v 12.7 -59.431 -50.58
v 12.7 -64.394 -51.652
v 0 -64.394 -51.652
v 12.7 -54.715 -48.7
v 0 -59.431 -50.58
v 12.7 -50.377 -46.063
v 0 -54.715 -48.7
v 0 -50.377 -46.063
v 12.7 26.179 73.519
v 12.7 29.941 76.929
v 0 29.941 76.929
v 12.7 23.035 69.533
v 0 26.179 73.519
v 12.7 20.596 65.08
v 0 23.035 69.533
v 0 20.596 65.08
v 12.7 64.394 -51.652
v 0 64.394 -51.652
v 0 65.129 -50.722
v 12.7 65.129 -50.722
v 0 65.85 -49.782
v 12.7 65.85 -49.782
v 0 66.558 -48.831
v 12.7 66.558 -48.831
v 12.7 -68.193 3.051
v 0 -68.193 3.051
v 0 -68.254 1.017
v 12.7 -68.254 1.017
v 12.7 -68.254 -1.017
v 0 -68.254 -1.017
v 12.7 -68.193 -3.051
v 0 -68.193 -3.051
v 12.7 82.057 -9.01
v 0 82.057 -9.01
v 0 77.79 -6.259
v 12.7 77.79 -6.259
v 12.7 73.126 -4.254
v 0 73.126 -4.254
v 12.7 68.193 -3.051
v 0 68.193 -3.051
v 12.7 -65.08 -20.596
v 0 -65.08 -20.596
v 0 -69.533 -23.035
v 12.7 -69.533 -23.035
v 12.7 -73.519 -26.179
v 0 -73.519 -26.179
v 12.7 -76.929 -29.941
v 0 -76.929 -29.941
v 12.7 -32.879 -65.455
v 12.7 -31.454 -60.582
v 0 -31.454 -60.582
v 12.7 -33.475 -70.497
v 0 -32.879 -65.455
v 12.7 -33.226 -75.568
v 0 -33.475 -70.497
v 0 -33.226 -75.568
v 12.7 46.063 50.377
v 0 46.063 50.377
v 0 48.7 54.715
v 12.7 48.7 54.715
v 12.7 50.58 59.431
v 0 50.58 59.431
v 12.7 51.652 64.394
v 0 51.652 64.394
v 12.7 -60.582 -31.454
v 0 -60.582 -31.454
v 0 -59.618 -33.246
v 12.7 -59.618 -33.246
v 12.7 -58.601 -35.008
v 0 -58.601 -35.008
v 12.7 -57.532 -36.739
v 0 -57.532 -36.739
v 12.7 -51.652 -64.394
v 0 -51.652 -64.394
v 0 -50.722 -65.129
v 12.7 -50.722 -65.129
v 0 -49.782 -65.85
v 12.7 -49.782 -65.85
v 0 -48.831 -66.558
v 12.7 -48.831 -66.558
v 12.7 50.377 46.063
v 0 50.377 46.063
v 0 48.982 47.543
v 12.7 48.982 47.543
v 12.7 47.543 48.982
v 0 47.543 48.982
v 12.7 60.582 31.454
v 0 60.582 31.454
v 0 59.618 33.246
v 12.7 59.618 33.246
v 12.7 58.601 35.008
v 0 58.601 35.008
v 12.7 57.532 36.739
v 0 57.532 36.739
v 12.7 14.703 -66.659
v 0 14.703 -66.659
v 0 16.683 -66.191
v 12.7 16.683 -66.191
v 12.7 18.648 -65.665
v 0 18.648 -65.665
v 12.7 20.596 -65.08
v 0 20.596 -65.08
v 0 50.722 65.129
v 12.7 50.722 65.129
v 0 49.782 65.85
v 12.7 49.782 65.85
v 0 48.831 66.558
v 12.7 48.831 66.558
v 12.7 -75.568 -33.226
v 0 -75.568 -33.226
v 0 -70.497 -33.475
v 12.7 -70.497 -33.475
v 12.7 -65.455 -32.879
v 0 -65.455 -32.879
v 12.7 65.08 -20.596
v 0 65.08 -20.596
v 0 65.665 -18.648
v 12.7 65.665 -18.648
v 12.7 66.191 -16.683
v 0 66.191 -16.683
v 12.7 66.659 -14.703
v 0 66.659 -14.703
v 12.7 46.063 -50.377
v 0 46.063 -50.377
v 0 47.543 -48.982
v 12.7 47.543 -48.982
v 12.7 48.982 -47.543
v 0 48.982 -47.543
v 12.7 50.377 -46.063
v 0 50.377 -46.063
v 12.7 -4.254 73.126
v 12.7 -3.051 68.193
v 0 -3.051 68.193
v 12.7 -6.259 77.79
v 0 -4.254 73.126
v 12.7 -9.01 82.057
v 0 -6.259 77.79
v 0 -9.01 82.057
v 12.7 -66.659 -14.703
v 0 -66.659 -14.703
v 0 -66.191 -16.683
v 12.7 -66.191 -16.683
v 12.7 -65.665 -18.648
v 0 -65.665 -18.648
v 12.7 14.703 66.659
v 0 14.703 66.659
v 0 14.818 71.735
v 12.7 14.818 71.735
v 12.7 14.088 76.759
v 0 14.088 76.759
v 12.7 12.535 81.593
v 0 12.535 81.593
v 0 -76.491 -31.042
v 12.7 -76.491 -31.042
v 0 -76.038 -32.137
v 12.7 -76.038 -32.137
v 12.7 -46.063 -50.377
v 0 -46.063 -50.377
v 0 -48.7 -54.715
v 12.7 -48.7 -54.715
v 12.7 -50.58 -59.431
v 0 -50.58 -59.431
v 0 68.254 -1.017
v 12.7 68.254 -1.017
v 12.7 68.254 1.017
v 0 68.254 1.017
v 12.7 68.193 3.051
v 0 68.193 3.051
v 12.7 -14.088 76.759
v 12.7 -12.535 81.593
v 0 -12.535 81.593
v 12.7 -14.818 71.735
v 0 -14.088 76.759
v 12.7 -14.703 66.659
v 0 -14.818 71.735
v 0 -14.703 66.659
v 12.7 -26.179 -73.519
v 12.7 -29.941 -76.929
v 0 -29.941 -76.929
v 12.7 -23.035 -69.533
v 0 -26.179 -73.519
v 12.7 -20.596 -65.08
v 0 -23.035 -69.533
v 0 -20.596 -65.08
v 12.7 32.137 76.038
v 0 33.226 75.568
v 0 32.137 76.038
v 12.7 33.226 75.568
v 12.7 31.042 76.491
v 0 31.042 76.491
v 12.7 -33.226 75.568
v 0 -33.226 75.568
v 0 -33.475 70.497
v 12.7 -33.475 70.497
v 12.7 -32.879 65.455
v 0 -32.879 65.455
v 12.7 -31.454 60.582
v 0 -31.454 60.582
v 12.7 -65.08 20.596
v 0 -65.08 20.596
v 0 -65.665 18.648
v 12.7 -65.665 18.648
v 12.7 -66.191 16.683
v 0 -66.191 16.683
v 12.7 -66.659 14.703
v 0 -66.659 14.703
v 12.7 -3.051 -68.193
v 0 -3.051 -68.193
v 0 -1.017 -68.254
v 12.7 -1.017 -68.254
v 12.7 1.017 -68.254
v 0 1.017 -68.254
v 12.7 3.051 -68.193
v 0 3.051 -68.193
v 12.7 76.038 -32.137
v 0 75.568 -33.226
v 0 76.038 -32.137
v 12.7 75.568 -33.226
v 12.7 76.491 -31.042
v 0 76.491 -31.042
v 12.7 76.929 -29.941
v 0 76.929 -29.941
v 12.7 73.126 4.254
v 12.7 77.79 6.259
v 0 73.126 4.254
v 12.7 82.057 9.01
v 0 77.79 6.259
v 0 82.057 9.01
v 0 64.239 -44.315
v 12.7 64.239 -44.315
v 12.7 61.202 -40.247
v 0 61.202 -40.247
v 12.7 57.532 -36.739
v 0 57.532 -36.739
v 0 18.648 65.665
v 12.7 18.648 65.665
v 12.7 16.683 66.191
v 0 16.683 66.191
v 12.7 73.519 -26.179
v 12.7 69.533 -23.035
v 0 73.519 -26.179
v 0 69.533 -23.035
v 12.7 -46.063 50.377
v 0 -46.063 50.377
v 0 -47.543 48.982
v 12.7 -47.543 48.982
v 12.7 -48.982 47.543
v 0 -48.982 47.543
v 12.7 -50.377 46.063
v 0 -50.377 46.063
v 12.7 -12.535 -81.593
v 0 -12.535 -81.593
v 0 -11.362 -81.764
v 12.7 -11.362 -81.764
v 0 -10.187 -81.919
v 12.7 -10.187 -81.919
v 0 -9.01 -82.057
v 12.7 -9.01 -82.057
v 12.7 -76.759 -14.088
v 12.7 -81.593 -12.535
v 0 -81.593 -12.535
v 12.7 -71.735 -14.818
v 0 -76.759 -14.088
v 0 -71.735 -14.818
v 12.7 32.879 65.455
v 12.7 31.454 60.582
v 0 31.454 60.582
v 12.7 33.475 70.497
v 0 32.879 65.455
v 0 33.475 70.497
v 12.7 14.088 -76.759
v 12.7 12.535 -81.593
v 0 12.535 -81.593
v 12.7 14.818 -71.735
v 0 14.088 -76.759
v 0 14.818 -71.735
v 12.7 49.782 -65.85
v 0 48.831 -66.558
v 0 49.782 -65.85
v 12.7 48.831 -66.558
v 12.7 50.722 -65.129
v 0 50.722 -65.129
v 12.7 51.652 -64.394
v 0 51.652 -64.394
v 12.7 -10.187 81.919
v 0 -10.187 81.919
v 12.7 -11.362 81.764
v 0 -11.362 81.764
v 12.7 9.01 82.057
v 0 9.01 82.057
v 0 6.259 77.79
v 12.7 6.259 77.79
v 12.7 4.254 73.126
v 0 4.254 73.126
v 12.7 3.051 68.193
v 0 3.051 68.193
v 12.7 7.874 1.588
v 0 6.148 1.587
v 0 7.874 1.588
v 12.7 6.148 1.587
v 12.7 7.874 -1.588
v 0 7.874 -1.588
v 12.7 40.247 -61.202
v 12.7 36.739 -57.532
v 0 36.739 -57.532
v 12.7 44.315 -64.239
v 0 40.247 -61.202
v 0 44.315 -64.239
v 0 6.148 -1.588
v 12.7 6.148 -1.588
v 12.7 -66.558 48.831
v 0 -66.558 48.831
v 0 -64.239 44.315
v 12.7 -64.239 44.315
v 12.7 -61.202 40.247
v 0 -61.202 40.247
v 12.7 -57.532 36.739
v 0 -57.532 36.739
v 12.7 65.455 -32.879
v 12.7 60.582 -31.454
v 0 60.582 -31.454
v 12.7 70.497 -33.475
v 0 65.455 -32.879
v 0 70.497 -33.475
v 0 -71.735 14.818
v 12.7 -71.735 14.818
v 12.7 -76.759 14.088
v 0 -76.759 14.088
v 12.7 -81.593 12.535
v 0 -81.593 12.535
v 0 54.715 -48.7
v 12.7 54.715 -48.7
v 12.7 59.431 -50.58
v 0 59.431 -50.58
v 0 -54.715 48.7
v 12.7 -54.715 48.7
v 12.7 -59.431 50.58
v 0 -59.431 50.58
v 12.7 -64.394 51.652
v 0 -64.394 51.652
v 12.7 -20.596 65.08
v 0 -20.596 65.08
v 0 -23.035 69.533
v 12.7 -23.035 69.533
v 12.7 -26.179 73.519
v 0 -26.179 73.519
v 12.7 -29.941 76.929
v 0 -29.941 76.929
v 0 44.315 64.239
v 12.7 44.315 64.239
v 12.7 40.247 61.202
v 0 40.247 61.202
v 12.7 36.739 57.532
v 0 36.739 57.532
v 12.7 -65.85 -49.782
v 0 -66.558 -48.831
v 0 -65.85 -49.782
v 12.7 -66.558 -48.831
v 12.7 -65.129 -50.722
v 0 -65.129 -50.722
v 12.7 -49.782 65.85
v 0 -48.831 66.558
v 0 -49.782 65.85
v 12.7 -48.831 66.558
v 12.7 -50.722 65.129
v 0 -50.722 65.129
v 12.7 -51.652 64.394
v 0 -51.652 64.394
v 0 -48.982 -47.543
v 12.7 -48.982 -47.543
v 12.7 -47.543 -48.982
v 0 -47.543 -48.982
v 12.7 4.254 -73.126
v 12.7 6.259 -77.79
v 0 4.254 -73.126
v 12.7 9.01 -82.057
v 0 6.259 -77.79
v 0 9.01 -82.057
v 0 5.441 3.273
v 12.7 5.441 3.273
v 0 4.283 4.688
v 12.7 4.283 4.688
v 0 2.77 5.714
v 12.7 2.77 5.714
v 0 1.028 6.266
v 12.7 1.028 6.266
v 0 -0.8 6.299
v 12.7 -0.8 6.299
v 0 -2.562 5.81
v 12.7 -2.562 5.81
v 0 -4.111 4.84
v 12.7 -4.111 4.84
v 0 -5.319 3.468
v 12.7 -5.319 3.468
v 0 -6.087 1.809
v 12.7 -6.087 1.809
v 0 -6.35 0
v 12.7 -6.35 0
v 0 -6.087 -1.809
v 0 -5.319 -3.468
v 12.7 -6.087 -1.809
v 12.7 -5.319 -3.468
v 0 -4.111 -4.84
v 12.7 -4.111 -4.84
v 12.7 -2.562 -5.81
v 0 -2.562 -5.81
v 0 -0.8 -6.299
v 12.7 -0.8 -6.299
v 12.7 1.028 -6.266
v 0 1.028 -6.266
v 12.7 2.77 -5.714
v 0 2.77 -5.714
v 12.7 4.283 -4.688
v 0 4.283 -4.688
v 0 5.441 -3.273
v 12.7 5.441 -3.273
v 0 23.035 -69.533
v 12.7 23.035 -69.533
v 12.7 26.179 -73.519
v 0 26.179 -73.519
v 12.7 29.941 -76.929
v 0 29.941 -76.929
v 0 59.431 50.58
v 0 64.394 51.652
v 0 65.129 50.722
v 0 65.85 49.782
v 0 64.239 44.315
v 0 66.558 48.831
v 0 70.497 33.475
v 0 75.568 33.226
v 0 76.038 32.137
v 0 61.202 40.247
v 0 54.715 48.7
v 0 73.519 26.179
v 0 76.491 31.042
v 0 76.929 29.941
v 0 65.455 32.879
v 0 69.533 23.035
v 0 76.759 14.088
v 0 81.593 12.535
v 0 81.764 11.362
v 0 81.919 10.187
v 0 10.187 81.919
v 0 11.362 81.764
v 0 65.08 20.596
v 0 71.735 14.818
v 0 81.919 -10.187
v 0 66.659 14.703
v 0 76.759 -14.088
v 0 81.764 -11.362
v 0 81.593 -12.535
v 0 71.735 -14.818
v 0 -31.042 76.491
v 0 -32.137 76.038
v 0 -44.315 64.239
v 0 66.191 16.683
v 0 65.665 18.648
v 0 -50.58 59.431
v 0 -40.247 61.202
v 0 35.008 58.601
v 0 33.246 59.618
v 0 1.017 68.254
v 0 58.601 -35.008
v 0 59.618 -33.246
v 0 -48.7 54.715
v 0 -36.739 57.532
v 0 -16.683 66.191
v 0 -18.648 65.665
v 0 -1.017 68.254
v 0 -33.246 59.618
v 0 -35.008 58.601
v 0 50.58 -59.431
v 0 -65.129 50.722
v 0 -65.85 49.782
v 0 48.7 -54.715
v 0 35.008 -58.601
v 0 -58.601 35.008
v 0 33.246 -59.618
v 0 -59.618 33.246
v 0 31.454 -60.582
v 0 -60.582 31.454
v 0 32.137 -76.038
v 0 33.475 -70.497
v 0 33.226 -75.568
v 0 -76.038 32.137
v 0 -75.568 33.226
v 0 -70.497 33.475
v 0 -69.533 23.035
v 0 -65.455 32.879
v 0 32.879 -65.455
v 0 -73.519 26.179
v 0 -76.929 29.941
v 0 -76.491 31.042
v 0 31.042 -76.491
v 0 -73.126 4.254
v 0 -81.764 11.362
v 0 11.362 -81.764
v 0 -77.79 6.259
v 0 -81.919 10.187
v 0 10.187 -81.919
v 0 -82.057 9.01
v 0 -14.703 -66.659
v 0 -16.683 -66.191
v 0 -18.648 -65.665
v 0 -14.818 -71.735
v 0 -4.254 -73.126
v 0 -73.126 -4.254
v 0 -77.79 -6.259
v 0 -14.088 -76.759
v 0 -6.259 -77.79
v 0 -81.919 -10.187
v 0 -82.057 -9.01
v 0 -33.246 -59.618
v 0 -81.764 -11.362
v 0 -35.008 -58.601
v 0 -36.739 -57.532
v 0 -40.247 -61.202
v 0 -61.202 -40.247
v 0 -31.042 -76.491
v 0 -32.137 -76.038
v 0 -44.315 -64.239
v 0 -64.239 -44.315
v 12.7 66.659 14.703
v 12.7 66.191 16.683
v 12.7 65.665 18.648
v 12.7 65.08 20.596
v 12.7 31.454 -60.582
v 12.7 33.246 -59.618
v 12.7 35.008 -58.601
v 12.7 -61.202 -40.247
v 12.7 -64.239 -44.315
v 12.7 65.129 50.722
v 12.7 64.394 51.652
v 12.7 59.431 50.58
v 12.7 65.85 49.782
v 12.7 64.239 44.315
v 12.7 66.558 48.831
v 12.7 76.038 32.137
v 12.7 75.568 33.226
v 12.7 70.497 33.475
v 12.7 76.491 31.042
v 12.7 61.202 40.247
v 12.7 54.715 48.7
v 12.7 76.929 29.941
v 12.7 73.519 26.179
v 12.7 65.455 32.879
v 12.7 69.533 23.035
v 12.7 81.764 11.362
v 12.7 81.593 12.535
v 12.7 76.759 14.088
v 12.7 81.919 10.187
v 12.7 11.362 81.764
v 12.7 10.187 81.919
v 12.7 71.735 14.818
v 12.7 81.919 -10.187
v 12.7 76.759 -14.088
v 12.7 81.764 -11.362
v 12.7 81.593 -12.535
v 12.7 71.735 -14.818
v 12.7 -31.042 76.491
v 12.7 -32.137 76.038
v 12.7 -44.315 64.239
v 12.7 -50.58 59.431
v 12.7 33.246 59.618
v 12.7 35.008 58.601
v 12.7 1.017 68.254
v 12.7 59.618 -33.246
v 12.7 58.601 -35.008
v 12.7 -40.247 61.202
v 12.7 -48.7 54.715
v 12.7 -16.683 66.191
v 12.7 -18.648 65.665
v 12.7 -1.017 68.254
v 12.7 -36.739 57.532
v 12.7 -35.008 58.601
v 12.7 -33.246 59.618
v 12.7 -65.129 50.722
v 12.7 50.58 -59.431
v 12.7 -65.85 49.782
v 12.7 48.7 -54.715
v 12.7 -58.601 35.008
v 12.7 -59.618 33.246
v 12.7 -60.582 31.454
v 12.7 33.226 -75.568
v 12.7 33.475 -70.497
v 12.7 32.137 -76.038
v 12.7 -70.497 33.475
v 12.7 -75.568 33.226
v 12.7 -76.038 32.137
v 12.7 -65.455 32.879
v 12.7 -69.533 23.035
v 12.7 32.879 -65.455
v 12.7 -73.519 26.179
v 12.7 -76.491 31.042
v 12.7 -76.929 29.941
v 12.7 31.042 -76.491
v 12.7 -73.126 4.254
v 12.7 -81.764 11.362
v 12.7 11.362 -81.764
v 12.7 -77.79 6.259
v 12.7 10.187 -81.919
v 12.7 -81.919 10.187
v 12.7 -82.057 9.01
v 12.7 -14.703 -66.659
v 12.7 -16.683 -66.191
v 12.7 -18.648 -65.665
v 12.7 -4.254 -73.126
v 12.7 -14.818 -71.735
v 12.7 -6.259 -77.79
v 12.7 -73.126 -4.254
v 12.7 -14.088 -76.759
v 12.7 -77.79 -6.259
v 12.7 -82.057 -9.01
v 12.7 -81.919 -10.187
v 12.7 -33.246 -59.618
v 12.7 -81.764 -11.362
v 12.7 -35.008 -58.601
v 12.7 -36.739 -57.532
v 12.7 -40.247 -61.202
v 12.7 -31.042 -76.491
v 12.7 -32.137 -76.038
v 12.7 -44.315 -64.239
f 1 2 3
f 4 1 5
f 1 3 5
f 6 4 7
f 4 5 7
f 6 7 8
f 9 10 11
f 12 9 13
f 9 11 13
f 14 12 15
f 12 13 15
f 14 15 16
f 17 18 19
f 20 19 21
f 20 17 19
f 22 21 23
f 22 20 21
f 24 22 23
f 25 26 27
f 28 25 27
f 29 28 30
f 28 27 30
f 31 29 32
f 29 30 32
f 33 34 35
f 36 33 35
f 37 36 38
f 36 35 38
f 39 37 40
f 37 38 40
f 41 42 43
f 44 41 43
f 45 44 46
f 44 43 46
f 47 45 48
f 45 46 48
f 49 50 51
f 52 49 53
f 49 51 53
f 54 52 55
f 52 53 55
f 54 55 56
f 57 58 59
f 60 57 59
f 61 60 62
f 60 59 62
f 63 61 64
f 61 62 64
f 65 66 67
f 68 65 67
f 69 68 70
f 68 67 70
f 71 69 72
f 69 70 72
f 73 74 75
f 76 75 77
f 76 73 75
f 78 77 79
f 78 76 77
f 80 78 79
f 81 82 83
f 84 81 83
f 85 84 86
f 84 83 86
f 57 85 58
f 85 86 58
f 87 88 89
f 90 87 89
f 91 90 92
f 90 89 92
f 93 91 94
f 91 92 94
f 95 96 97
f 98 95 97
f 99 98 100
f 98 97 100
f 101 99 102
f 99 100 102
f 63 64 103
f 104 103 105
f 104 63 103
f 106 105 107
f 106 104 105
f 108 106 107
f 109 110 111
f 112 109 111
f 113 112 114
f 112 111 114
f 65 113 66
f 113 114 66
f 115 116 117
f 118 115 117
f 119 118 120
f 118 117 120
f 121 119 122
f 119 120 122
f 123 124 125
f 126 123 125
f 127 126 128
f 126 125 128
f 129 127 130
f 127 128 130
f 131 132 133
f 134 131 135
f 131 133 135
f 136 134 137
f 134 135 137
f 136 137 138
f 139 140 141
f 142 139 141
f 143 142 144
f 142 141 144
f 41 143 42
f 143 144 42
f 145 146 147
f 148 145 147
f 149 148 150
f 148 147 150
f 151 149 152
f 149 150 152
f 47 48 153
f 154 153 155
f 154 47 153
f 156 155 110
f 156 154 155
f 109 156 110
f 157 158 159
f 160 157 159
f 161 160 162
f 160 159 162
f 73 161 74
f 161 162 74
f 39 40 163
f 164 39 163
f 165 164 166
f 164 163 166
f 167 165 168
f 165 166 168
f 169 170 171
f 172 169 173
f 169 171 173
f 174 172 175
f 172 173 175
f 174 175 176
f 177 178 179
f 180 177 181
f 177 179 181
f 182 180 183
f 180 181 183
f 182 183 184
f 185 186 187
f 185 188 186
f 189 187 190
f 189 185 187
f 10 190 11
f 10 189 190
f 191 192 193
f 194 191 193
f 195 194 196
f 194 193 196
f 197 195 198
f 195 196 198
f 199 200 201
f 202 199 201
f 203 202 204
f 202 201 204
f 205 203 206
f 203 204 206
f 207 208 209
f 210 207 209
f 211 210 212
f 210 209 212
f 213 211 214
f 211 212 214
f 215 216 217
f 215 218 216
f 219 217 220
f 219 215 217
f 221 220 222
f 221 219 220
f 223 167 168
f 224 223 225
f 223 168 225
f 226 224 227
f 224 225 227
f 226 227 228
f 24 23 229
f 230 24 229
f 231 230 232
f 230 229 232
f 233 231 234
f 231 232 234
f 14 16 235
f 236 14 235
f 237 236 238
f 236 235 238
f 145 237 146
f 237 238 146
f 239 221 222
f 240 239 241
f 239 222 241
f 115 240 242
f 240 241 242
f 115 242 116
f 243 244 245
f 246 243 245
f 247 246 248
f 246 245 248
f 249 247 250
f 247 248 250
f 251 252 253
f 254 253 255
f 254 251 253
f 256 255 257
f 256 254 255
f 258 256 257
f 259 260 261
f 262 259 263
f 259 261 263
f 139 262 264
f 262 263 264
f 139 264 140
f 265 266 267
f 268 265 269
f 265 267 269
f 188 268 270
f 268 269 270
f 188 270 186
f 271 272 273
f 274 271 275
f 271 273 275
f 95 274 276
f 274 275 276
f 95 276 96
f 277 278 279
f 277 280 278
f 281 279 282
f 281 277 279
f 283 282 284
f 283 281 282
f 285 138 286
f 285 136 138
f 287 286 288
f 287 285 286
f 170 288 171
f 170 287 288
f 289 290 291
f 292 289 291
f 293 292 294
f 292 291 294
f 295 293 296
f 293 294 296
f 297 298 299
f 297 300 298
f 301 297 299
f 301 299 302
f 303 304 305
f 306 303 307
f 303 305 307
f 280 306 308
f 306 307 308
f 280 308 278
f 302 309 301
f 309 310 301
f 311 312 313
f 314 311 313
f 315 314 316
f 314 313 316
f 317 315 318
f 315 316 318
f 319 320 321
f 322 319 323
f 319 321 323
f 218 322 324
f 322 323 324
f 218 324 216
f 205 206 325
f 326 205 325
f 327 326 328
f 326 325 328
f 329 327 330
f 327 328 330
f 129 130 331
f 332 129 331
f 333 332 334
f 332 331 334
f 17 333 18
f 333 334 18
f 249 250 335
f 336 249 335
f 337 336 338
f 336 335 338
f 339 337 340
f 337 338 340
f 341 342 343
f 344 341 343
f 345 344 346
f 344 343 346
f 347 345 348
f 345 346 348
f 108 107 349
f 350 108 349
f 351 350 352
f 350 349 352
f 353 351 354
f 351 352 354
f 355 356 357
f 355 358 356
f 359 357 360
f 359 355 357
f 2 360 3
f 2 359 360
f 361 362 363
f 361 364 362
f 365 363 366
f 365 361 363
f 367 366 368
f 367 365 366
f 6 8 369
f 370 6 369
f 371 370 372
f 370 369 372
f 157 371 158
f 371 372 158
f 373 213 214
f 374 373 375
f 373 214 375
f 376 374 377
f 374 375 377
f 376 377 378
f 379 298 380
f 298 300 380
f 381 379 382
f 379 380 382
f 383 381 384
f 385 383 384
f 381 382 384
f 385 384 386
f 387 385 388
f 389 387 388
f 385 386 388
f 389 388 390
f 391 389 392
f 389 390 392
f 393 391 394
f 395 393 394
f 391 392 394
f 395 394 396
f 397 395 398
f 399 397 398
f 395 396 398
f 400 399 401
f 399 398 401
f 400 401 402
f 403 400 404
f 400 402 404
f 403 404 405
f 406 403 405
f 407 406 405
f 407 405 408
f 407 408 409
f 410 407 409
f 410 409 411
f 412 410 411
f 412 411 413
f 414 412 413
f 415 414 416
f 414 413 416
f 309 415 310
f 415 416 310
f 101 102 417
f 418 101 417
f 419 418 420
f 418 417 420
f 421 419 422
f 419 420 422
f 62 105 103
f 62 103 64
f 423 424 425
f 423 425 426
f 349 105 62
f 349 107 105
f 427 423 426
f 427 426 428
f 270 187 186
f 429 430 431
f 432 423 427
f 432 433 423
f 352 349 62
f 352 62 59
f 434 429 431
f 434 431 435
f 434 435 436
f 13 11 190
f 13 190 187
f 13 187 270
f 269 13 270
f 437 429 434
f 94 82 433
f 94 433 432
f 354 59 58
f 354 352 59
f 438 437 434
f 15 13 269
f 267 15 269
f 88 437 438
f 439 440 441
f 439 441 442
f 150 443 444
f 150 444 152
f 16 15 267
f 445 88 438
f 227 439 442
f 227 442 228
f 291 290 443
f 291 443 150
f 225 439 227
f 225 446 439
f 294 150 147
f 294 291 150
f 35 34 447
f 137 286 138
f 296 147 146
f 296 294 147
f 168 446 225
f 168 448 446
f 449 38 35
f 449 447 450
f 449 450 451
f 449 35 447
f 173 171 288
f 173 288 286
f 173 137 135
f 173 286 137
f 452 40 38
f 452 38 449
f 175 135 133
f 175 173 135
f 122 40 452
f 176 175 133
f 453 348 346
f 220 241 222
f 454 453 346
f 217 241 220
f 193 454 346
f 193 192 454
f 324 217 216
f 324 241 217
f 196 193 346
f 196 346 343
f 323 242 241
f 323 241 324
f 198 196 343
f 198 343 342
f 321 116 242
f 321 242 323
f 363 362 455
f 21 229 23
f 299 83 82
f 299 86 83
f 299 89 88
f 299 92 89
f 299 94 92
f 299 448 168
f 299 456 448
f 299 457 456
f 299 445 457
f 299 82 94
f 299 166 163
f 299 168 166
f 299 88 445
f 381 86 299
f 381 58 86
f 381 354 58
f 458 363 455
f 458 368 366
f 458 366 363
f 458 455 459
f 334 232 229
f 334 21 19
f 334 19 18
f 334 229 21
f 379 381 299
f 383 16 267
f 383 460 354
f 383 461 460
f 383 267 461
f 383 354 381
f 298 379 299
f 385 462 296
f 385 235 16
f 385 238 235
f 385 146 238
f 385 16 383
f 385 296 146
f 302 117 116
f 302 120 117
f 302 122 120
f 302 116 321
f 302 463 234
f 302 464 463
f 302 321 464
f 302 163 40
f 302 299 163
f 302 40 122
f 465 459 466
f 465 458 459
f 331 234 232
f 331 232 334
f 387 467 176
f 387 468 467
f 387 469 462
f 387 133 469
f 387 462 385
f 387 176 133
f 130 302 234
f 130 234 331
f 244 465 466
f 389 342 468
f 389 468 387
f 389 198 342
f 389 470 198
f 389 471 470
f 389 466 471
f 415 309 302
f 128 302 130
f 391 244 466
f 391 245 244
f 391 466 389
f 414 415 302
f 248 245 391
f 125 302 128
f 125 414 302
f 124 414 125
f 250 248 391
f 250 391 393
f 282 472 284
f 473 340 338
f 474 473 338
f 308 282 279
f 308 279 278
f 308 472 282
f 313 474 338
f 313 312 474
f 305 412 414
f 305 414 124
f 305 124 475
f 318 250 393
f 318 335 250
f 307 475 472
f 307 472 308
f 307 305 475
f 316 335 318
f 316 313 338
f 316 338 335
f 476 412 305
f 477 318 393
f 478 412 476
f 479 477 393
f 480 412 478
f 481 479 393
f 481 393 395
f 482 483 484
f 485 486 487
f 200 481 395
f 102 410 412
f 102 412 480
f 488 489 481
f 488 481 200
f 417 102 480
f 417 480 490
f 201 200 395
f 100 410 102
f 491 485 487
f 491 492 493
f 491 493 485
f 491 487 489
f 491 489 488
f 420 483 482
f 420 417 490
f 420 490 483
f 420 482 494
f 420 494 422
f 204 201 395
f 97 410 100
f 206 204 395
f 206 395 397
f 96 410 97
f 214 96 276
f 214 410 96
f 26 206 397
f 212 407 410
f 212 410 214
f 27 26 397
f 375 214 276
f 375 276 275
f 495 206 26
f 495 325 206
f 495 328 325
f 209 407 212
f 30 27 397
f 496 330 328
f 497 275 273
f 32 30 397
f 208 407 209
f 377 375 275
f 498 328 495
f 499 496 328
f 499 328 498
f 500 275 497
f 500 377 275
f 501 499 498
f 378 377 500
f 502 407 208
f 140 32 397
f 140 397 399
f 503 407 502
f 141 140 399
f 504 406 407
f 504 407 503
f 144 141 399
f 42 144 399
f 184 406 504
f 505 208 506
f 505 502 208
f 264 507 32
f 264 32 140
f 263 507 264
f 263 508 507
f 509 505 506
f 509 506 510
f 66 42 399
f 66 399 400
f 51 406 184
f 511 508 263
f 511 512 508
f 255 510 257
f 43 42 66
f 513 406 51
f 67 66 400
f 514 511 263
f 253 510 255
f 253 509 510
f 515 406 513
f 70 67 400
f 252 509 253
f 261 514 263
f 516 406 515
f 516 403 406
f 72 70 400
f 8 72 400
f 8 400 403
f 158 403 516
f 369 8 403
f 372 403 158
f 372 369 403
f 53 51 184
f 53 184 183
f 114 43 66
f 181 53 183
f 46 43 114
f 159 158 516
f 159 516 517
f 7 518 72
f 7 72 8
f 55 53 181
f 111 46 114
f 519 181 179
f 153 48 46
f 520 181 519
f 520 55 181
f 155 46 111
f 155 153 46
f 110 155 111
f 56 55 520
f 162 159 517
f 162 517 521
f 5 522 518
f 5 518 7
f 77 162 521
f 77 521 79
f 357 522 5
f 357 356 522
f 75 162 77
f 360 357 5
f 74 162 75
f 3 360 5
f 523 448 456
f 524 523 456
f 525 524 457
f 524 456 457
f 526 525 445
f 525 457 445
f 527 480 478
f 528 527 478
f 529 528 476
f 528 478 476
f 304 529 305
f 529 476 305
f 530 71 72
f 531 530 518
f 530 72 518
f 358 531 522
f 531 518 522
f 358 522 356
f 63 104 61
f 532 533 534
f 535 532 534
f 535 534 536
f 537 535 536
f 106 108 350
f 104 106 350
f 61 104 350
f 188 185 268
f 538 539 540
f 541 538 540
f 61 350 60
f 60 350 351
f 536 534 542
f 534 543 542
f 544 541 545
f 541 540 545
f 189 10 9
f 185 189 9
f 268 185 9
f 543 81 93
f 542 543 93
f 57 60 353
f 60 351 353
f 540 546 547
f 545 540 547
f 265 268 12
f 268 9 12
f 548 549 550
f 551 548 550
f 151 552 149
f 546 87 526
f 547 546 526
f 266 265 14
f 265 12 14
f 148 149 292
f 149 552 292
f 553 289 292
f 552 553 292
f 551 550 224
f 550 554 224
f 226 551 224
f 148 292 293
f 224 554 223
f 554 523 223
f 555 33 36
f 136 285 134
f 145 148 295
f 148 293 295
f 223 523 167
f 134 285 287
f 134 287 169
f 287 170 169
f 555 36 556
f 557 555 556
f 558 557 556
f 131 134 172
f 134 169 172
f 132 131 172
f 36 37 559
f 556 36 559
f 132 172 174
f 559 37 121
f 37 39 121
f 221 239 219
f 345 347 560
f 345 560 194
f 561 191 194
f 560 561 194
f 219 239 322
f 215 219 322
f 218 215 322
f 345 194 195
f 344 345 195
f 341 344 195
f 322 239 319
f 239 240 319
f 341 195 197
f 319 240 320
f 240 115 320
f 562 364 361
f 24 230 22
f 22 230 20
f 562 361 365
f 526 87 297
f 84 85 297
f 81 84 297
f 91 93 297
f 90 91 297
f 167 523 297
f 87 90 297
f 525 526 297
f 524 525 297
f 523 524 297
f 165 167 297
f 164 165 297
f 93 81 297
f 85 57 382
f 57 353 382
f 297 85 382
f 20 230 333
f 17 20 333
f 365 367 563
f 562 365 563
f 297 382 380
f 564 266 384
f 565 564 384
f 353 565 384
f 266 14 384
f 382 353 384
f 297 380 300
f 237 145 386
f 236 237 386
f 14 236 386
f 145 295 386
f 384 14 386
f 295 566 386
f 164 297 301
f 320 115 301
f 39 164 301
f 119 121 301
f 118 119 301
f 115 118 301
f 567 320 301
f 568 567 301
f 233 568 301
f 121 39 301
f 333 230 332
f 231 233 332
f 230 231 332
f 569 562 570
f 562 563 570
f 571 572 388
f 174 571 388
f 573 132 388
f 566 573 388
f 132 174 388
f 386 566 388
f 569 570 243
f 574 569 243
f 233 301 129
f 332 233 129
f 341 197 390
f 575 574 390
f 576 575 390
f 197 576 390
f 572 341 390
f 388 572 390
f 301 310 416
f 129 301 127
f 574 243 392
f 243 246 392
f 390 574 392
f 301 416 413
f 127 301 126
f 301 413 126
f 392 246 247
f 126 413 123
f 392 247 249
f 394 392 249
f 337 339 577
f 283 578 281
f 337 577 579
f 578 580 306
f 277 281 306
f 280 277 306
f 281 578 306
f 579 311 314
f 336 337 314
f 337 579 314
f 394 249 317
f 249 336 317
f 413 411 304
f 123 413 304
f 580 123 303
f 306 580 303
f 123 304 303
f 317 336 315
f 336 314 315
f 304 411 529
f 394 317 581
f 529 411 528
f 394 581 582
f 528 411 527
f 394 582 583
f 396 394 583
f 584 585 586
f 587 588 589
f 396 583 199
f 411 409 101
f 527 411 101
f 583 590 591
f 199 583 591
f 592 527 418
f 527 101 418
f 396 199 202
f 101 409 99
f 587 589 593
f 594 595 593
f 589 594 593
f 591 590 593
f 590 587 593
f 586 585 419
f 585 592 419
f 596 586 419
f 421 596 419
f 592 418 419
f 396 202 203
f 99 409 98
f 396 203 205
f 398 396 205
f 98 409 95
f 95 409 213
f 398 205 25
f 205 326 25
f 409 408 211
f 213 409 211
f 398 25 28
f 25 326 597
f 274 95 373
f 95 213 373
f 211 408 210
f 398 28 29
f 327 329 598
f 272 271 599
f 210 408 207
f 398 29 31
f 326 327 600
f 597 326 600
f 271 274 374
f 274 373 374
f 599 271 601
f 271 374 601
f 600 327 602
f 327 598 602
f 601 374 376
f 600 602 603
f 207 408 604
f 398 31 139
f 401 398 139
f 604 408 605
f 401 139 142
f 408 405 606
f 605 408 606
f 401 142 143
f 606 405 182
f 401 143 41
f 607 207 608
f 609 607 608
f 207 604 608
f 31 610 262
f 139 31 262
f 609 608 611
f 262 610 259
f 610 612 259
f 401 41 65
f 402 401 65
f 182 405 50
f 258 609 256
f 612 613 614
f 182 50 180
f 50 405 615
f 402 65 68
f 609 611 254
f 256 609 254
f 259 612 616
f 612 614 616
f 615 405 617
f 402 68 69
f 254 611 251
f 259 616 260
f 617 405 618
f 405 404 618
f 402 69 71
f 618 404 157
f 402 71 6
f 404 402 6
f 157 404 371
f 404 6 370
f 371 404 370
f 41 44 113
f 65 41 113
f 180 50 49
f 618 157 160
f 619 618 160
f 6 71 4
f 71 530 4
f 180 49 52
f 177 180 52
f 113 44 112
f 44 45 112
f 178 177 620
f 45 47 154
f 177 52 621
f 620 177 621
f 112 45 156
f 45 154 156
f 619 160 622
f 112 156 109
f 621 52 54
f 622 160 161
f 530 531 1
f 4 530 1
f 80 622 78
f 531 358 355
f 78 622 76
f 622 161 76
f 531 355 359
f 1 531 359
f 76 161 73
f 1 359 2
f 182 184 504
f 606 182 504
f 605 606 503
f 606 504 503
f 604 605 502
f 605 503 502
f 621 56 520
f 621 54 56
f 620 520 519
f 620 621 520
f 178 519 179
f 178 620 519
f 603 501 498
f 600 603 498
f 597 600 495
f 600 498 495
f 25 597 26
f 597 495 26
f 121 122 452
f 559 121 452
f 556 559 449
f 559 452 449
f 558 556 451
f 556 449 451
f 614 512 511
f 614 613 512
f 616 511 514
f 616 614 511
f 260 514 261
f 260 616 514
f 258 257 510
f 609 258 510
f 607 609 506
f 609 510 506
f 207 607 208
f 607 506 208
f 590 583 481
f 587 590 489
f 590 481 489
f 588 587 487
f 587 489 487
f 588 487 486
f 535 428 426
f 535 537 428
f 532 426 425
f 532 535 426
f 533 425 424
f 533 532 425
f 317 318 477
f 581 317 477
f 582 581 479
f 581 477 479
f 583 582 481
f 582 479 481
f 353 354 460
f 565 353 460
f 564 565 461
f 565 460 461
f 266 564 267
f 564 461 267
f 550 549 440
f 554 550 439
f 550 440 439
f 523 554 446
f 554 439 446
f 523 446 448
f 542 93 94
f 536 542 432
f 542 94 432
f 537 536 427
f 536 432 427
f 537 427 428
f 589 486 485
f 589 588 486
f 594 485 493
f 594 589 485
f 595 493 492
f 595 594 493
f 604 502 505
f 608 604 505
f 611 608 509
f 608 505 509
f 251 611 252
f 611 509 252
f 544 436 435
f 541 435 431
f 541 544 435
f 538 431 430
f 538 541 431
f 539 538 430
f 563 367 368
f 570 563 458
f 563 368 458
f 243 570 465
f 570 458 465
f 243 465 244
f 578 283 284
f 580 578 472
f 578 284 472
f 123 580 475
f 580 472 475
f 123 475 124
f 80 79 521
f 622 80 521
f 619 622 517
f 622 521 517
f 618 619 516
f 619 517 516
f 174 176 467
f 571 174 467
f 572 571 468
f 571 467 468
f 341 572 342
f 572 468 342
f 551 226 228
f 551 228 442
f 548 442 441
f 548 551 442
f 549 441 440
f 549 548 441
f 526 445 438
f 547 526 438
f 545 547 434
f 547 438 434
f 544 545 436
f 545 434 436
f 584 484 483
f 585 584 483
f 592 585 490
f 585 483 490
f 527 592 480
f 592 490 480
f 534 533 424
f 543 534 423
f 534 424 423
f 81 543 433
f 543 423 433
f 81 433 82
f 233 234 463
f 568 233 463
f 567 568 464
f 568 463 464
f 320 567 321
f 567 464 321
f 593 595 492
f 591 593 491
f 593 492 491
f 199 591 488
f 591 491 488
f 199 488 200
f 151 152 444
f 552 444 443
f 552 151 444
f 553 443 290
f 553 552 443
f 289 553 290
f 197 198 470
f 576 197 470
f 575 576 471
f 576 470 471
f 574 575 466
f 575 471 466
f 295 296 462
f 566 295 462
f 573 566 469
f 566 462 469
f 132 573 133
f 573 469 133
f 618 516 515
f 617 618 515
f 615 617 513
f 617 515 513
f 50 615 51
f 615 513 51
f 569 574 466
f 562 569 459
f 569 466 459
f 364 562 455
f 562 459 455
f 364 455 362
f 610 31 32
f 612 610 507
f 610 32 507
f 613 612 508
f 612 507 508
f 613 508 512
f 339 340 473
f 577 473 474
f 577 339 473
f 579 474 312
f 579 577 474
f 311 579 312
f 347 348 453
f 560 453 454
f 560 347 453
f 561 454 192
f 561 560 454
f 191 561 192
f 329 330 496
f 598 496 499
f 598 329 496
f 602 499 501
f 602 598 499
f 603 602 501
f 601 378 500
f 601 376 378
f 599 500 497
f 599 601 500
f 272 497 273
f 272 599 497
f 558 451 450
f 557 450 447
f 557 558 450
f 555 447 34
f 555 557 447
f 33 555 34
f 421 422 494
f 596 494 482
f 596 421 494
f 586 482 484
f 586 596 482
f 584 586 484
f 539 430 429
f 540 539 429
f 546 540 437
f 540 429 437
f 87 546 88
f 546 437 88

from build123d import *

# Parameters (mm, degrees)
BASPROSKE_W     = 12.7
BASPROSKE_H     = 82.55
TOOTHCUT_DEPTH  = 118.432086757
TEETHCUTS_COUNT = 24
TEETHCUTS_ANGLE = 345
BORSKE_R        = 6.35
BORE_DEPTH      = 50.8000508
KEYSKE_W        = 3.175
KEYSKE_H        = 7.874
KEYWAY_DEPTH    = 50.8000508


with BuildPart() as part:
    # BasProSke → Base-Revolve (revolve)
    with BuildSketch(Plane(origin=(0, 0, 0), x_dir=(1, 0, 0), z_dir=(0, 1, 0)), mode=Mode.PRIVATE) as base_revolve_sk:
        with Locations((6.35, 41.275)):
            Rectangle(BASPROSKE_W, BASPROSKE_H)
    revolve(base_revolve_sk.sketch.rotate(Axis((-10, 0, 0), (1, 0, 0)), 180), axis=Axis((-10, 0, 0), (1, 0, 0)))

    # TooCutSke → ToothCut (cut, through all)
    with BuildSketch(Plane(origin=(0, 0, 0), x_dir=(0, 0, -1), z_dir=(1, 0, 0))):
        with BuildLine():
            ThreePointArc((3.050766134, 68.193022716), (0, 68.26123), (-3.050766134, 68.193022716))
            ThreePointArc((-3.050766134, 68.193022716), (-5.164725154, 75.513208068), (-9.02816666, 82.080380676))
            ThreePointArc((-9.02816666, 82.080380676), (0, 82.5754), (9.02816666, 82.080380676))
            ThreePointArc((9.02816666, 82.080380676), (5.164725154, 75.513208068), (3.050766134, 68.193022716))
        make_face()
    toothcut = extrude(amount=TOOTHCUT_DEPTH, mode=Mode.SUBTRACT)

    # TeethCuts: ToothCut ×24 about axis
    teethcuts_axis = Axis((-10, 0, 0), (1, 0, 0))
    for i in range(1, TEETHCUTS_COUNT):
        add(toothcut.rotate(teethcuts_axis, i * TEETHCUTS_ANGLE / (TEETHCUTS_COUNT - 1)), mode=Mode.SUBTRACT)

    # BorSke → Bore (cut, symmetric)
    with BuildSketch(Plane(origin=(0, 0, 0), x_dir=(0, 0, -1), z_dir=(1, 0, 0))):
        with Locations(Location((0, 0, 0), (0, 0, 180))):
            Circle(BORSKE_R)
    extrude(amount=BORE_DEPTH, both=True, mode=Mode.SUBTRACT)

    # KeySke → Keyway (cut, symmetric)
    with BuildSketch(Plane(origin=(0, 0, 0), x_dir=(0, 0, -1), z_dir=(1, 0, 0))):
        with Locations((0, 3.937)):
            Rectangle(KEYSKE_W, KEYSKE_H)
    extrude(amount=KEYWAY_DEPTH, both=True, mode=Mode.SUBTRACT)


solid = part.part
